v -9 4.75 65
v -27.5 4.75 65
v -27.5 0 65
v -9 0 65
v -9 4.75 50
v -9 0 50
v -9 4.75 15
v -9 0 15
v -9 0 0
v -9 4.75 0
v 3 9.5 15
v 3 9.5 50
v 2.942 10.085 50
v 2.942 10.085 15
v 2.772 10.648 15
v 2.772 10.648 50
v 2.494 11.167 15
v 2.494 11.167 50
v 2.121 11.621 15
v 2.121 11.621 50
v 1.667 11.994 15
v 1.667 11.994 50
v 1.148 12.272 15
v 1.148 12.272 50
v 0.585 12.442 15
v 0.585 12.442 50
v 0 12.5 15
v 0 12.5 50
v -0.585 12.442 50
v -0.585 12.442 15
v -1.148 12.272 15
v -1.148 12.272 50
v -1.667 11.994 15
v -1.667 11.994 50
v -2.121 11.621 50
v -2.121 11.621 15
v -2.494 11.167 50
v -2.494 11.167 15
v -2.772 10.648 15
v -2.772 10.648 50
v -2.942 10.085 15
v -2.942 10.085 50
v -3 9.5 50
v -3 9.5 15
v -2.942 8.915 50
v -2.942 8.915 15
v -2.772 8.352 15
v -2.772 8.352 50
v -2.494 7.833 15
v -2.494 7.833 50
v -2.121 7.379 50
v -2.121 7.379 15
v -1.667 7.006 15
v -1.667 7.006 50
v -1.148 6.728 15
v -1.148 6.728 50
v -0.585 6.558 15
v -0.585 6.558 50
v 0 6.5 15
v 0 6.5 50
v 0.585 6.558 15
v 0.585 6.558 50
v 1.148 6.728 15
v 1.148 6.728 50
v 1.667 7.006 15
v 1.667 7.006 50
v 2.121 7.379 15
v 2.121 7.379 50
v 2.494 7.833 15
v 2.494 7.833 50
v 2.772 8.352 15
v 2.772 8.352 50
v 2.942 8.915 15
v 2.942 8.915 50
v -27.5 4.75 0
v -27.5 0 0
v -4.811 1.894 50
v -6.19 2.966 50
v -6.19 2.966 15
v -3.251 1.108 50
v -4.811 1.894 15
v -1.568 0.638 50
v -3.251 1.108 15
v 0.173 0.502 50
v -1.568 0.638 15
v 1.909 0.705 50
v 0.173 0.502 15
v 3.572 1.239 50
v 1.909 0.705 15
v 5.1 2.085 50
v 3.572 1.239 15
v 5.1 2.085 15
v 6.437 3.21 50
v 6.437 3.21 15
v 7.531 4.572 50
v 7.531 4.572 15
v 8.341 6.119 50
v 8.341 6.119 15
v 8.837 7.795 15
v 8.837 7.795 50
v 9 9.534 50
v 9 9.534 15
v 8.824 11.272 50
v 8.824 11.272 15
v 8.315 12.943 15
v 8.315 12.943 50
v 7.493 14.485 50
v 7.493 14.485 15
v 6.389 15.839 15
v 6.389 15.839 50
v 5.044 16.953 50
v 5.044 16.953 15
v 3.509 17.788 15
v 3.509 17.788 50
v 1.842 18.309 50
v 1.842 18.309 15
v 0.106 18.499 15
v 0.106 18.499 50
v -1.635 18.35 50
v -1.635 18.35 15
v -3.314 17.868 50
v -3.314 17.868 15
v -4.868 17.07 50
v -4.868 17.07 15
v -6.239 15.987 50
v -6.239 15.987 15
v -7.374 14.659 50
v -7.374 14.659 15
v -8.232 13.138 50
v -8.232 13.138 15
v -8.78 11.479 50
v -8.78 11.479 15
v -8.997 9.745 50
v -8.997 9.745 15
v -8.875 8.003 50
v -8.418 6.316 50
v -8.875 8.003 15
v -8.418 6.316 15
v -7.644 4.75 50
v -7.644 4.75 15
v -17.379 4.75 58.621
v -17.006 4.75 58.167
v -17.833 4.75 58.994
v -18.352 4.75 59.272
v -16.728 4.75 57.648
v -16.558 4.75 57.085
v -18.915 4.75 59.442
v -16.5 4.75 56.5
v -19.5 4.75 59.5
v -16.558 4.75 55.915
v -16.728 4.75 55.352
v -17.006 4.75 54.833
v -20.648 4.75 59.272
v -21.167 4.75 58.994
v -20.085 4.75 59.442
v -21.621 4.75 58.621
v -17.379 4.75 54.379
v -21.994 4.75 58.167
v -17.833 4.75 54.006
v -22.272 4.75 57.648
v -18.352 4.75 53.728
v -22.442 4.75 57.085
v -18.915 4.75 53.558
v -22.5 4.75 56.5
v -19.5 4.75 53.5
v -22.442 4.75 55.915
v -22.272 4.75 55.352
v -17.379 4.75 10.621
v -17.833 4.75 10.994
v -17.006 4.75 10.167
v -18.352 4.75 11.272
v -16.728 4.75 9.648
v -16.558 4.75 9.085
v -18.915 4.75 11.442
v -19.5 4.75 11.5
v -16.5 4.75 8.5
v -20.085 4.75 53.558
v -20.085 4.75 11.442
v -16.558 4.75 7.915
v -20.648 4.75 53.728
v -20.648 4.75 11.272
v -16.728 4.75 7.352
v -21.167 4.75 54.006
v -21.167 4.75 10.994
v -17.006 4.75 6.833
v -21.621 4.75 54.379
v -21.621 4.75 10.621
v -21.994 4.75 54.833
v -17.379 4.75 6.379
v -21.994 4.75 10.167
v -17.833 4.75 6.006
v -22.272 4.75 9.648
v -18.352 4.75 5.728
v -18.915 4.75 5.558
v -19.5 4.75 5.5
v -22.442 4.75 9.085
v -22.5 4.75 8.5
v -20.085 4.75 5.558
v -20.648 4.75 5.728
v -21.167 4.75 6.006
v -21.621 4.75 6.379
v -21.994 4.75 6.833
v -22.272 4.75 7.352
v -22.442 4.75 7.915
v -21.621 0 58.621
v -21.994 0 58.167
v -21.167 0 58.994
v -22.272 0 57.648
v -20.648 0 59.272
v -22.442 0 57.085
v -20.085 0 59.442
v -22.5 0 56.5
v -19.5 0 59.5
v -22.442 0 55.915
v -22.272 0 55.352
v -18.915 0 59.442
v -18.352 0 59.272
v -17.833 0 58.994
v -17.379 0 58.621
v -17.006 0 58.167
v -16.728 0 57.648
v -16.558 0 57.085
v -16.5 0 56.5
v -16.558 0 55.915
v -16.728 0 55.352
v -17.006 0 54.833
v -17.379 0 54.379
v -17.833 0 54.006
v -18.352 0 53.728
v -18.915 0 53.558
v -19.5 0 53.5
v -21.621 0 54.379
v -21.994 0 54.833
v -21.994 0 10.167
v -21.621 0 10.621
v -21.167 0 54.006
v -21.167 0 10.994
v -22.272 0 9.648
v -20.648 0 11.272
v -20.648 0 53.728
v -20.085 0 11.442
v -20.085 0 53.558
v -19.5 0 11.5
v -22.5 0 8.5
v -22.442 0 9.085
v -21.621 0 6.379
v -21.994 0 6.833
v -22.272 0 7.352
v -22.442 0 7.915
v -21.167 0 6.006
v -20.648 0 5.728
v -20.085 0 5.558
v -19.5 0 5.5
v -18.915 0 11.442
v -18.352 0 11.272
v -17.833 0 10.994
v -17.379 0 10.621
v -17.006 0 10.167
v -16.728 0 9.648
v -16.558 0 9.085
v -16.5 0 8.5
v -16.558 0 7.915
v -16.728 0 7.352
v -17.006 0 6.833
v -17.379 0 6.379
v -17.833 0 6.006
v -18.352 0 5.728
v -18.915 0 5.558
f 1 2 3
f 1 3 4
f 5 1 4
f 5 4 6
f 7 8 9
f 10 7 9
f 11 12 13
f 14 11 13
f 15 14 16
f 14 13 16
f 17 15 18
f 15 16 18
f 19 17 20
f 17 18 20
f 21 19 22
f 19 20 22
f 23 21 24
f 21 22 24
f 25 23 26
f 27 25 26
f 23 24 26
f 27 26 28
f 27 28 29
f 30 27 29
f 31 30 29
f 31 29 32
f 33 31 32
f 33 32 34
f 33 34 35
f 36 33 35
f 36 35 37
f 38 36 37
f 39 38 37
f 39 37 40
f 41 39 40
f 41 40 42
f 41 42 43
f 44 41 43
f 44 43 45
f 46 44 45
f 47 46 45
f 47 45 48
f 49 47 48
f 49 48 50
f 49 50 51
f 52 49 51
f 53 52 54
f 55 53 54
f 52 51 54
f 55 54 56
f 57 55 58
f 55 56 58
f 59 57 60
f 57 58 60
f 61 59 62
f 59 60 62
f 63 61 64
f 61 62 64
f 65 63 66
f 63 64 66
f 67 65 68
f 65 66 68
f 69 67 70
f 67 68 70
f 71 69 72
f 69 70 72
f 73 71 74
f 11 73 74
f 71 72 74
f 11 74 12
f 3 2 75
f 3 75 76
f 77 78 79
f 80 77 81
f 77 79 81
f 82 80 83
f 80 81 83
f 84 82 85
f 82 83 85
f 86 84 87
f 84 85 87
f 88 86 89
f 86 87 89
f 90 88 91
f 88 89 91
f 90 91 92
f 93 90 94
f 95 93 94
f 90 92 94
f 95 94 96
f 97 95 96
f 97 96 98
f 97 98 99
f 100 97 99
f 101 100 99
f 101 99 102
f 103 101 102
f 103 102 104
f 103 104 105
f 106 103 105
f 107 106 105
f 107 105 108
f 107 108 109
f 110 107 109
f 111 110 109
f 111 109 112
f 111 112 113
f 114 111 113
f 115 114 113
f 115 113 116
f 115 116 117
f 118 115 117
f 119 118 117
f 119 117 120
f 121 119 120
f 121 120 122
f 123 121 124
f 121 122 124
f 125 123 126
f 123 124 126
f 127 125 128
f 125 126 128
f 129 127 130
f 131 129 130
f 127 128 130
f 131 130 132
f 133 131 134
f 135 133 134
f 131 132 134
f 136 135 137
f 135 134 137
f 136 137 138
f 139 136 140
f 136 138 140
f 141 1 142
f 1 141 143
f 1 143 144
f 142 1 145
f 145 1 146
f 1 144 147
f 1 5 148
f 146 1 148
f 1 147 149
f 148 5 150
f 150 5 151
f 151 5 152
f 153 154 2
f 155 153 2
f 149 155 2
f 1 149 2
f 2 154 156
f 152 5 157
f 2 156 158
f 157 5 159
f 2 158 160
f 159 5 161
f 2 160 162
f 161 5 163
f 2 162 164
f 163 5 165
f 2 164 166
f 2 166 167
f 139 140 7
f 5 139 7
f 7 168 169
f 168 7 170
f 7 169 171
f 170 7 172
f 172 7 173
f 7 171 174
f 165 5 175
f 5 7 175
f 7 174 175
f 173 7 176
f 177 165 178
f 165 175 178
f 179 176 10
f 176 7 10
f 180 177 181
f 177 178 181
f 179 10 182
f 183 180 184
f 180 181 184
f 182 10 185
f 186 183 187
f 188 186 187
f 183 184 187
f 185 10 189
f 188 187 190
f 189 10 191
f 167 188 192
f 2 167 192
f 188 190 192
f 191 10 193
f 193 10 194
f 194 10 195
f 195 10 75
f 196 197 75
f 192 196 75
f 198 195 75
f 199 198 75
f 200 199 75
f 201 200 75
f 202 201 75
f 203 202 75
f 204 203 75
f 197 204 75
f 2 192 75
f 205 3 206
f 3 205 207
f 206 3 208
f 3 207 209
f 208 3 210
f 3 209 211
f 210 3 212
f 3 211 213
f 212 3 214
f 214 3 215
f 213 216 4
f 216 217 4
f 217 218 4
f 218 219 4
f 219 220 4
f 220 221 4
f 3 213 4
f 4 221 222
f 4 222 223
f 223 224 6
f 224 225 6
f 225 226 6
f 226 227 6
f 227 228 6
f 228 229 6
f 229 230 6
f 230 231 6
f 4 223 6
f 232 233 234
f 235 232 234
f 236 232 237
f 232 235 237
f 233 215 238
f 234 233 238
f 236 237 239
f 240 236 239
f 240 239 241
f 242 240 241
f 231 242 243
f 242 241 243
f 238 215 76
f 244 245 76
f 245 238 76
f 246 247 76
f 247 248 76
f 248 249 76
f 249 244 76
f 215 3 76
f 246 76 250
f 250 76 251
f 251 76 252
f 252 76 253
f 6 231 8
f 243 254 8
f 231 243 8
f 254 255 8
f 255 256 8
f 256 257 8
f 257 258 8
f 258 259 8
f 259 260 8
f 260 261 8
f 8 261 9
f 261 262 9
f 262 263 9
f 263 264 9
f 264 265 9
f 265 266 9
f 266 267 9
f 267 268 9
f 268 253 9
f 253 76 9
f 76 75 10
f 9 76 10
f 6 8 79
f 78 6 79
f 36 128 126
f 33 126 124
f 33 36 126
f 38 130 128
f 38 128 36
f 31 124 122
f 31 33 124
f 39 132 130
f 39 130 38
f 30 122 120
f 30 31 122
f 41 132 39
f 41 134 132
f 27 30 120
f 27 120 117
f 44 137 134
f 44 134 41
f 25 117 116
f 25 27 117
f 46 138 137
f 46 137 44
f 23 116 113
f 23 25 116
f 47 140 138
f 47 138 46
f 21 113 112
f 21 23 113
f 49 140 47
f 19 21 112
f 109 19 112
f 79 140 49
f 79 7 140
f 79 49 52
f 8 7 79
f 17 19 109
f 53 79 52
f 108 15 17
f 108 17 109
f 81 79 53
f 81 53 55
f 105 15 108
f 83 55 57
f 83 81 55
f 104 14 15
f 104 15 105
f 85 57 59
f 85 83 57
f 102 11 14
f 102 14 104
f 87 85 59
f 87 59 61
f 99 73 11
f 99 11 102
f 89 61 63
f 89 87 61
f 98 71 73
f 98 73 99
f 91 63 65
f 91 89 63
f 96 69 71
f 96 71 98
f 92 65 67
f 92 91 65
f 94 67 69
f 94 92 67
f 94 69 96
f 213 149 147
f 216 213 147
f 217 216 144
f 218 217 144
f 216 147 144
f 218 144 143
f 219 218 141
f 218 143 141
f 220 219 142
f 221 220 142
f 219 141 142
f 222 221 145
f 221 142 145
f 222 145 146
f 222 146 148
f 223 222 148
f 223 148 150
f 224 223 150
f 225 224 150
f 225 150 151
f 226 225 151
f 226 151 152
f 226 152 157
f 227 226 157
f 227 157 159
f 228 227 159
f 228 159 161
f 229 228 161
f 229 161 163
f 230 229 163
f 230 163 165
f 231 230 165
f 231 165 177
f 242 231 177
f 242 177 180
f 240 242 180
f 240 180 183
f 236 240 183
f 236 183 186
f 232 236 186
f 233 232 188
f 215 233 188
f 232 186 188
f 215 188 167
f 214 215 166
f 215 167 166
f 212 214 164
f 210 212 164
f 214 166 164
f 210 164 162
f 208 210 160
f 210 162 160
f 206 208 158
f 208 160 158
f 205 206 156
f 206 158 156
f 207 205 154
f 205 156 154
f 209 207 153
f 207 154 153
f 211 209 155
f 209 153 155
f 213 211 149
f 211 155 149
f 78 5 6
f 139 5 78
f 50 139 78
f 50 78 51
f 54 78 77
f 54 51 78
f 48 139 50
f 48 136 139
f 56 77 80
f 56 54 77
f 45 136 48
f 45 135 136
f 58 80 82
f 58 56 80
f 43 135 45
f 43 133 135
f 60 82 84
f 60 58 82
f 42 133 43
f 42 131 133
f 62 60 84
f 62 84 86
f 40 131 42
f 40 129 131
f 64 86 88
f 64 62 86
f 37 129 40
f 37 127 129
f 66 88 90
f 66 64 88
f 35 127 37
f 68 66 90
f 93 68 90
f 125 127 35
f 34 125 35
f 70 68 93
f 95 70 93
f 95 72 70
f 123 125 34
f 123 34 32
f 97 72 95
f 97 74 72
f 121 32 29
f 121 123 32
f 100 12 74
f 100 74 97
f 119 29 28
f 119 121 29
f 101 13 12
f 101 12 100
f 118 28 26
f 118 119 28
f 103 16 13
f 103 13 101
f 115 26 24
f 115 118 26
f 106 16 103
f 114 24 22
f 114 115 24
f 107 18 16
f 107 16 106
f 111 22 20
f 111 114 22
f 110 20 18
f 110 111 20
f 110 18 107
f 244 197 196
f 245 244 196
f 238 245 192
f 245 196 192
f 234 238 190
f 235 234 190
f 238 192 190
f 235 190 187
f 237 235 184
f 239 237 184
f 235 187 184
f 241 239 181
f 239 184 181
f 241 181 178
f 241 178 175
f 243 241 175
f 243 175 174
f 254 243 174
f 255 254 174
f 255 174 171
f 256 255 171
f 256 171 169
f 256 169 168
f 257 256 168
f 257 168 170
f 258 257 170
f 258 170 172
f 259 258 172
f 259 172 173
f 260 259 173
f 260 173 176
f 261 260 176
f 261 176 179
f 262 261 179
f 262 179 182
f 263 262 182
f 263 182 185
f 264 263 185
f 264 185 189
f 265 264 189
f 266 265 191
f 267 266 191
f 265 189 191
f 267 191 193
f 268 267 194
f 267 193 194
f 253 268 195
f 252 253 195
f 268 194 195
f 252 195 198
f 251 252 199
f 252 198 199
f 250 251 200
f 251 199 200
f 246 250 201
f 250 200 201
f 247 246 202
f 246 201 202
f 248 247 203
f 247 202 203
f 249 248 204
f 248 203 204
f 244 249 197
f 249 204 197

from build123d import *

# Parameters (mm, degrees)
EXTRUDE_1_DEPTH     = 65
SKETCH_2_R          = 3
CUT_EXTRUDE_1_DEPTH = 65
SKETCH_3_W          = 18
SKETCH_3_H          = 15
CUT_EXTRUDE_2_DEPTH = 25
SKETCH_4_R          = 3
CUT_EXTRUDE_3_DEPTH = 50


with BuildPart() as part:
    # 草图1 → 凸台-拉伸1 (new body)
    with BuildSketch(Plane.XY):
        with BuildLine():
            Line((-27.5, 4.75), (-27.5, 0))
            Line((-27.5, 0), (-9, 0))
            Line((-9, 0), (-6.189701831, 2.966425845))
            ThreePointArc((-6.189701831, 2.966425845), (6.974322263, 15.188482133), (-7.644442426, 4.75))
            Line((-7.644442426, 4.75), (-27.5, 4.75))
        make_face()
    extrude(amount=EXTRUDE_1_DEPTH)

    # 草图2 → 切除-拉伸1 (cut)
    with BuildSketch(Plane(origin=(0, 4.75, 0), x_dir=(1, 0, 0), z_dir=(0, 1, 0))):
        with Locations(Location((-19.5, -8.5, 0), (0, 0, 180))):
            Circle(SKETCH_2_R)
        with Locations(Location((-19.5, -56.5, 0), (0, 0, 270))):
            Circle(SKETCH_2_R)
    extrude(amount=-CUT_EXTRUDE_1_DEPTH, mode=Mode.SUBTRACT)

    # 草图3 → 切除-拉伸2 (cut, symmetric)
    with BuildSketch(Plane(origin=(0, 4.75, 0), x_dir=(1, 0, 0), z_dir=(0, 1, 0))):
        with Locations((0, -7.5)):
            Rectangle(SKETCH_3_W, SKETCH_3_H)
        with Locations((0, -57.5)):
            Rectangle(SKETCH_3_W, SKETCH_3_H)
    extrude(amount=CUT_EXTRUDE_2_DEPTH, both=True, mode=Mode.SUBTRACT)

    # 草图4 → 切除-拉伸3 (cut)
    with BuildSketch(Plane.XY.offset(50)):
        with Locations((0, 9.5)):
            Circle(SKETCH_4_R)
    extrude(amount=-CUT_EXTRUDE_3_DEPTH, mode=Mode.SUBTRACT)


solid = part.part
